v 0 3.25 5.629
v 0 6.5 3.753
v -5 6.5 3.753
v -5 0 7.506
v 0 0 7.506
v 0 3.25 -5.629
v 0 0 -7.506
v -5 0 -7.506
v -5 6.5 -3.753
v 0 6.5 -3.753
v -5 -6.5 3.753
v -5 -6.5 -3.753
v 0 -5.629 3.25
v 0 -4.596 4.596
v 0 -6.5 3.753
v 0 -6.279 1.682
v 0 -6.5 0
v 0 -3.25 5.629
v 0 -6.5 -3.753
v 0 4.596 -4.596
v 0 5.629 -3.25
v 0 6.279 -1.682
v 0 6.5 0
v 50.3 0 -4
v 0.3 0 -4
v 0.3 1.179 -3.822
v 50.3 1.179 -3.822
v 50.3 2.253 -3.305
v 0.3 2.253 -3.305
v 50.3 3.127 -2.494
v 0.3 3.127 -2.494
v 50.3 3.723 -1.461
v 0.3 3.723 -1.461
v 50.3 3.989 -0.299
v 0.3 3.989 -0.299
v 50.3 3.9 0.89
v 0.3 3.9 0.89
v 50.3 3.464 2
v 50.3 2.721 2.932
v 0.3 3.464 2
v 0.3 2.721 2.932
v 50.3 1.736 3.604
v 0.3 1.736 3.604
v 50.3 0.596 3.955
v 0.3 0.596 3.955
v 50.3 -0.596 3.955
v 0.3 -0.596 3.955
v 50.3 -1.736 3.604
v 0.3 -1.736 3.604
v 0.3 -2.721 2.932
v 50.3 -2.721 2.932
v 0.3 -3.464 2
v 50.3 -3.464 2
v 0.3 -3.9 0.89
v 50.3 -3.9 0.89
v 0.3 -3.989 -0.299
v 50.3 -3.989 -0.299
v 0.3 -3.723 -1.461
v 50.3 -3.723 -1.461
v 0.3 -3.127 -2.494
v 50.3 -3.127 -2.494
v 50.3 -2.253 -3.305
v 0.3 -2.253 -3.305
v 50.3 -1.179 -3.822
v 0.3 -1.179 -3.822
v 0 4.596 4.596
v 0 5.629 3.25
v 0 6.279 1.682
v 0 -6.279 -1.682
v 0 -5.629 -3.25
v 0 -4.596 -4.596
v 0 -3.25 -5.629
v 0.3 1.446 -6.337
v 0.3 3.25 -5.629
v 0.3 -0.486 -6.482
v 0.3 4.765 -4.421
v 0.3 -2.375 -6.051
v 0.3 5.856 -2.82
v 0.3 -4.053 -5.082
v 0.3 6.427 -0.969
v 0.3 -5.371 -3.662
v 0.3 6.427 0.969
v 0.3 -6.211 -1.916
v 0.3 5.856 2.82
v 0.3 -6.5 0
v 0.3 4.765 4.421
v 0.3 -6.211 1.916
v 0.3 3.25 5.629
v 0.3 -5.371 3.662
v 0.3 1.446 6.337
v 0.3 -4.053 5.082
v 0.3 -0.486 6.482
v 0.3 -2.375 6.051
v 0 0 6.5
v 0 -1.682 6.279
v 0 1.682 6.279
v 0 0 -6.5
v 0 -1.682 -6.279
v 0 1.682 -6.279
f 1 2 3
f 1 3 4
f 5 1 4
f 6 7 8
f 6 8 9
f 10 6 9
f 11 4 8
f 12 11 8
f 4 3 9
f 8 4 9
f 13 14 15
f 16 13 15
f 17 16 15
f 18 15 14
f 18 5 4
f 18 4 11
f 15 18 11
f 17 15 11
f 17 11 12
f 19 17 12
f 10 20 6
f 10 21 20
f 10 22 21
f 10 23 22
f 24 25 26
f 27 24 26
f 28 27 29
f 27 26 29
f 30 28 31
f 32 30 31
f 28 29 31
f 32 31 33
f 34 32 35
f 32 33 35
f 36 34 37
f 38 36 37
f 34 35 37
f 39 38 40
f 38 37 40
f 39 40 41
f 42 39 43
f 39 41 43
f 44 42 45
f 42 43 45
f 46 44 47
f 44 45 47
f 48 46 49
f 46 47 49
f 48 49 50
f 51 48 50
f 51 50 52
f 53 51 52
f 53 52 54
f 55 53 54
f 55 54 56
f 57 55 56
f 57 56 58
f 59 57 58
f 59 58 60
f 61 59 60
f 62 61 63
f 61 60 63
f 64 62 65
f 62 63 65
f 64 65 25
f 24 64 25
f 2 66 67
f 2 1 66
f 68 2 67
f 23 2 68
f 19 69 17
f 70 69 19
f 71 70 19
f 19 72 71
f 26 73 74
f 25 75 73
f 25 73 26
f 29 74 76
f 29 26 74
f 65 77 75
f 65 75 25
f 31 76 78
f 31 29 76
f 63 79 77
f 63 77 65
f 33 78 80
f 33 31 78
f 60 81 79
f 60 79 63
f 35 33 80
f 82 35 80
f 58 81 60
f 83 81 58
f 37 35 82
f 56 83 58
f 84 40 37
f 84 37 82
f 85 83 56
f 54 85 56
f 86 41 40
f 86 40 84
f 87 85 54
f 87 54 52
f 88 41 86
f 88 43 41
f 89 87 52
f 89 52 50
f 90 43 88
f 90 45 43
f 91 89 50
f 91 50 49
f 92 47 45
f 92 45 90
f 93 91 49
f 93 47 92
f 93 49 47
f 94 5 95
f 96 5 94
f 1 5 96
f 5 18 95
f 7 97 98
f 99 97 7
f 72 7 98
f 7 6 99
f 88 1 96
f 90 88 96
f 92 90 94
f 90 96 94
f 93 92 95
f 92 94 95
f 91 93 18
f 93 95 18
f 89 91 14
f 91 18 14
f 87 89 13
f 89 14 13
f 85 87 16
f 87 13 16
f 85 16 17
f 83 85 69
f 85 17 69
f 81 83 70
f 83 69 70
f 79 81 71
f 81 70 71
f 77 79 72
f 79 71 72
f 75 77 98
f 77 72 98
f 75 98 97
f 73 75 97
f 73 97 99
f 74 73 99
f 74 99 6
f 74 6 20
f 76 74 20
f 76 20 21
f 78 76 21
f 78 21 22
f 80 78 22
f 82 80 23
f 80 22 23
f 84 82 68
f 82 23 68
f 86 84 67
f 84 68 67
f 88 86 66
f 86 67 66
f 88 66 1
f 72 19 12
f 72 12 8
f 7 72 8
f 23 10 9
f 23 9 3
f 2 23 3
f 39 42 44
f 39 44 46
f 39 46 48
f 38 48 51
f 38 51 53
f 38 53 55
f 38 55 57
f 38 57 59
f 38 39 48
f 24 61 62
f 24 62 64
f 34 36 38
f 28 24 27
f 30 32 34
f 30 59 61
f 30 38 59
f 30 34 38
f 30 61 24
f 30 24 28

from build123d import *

# Parameters (mm, degrees)
BOSS_EXTRUDE1_DEPTH = 5
SKETCH2_R           = 6.5
BOSS_EXTRUDE2_DEPTH = 0.3
SKETCH3_R           = 4
BOSS_EXTRUDE3_DEPTH = 50


with BuildPart() as part:
    # Sketch1 → Boss-Extrude1 (new body)
    with BuildSketch(Plane(origin=(0, 0, 0), x_dir=(0, 0, -1), z_dir=(1, 0, 0))):
        Polygon((-7.505553499, 0), (-3.75277675, -6.5), (3.75277675, -6.5), (7.505553499, 0), (3.75277675, 6.5), (-3.75277675, 6.5), align=None)
    extrude(amount=-BOSS_EXTRUDE1_DEPTH)

    # Sketch2 → Boss-Extrude2 (add)
    with BuildSketch(Plane(origin=(0, 0, 0), x_dir=(0, 0, -1), z_dir=(1, 0, 0))):
        with Locations(Location((0, 0, 0), (0, 0, 150))):
            Circle(SKETCH2_R)
    extrude(amount=BOSS_EXTRUDE2_DEPTH)

    # Sketch3 → Boss-Extrude3 (add)
    with BuildSketch(Plane(origin=(0.3, 0, 0), x_dir=(0, 0, -1), z_dir=(1, 0, 0))):
        Circle(SKETCH3_R)
    extrude(amount=BOSS_EXTRUDE3_DEPTH)


solid = part.part
